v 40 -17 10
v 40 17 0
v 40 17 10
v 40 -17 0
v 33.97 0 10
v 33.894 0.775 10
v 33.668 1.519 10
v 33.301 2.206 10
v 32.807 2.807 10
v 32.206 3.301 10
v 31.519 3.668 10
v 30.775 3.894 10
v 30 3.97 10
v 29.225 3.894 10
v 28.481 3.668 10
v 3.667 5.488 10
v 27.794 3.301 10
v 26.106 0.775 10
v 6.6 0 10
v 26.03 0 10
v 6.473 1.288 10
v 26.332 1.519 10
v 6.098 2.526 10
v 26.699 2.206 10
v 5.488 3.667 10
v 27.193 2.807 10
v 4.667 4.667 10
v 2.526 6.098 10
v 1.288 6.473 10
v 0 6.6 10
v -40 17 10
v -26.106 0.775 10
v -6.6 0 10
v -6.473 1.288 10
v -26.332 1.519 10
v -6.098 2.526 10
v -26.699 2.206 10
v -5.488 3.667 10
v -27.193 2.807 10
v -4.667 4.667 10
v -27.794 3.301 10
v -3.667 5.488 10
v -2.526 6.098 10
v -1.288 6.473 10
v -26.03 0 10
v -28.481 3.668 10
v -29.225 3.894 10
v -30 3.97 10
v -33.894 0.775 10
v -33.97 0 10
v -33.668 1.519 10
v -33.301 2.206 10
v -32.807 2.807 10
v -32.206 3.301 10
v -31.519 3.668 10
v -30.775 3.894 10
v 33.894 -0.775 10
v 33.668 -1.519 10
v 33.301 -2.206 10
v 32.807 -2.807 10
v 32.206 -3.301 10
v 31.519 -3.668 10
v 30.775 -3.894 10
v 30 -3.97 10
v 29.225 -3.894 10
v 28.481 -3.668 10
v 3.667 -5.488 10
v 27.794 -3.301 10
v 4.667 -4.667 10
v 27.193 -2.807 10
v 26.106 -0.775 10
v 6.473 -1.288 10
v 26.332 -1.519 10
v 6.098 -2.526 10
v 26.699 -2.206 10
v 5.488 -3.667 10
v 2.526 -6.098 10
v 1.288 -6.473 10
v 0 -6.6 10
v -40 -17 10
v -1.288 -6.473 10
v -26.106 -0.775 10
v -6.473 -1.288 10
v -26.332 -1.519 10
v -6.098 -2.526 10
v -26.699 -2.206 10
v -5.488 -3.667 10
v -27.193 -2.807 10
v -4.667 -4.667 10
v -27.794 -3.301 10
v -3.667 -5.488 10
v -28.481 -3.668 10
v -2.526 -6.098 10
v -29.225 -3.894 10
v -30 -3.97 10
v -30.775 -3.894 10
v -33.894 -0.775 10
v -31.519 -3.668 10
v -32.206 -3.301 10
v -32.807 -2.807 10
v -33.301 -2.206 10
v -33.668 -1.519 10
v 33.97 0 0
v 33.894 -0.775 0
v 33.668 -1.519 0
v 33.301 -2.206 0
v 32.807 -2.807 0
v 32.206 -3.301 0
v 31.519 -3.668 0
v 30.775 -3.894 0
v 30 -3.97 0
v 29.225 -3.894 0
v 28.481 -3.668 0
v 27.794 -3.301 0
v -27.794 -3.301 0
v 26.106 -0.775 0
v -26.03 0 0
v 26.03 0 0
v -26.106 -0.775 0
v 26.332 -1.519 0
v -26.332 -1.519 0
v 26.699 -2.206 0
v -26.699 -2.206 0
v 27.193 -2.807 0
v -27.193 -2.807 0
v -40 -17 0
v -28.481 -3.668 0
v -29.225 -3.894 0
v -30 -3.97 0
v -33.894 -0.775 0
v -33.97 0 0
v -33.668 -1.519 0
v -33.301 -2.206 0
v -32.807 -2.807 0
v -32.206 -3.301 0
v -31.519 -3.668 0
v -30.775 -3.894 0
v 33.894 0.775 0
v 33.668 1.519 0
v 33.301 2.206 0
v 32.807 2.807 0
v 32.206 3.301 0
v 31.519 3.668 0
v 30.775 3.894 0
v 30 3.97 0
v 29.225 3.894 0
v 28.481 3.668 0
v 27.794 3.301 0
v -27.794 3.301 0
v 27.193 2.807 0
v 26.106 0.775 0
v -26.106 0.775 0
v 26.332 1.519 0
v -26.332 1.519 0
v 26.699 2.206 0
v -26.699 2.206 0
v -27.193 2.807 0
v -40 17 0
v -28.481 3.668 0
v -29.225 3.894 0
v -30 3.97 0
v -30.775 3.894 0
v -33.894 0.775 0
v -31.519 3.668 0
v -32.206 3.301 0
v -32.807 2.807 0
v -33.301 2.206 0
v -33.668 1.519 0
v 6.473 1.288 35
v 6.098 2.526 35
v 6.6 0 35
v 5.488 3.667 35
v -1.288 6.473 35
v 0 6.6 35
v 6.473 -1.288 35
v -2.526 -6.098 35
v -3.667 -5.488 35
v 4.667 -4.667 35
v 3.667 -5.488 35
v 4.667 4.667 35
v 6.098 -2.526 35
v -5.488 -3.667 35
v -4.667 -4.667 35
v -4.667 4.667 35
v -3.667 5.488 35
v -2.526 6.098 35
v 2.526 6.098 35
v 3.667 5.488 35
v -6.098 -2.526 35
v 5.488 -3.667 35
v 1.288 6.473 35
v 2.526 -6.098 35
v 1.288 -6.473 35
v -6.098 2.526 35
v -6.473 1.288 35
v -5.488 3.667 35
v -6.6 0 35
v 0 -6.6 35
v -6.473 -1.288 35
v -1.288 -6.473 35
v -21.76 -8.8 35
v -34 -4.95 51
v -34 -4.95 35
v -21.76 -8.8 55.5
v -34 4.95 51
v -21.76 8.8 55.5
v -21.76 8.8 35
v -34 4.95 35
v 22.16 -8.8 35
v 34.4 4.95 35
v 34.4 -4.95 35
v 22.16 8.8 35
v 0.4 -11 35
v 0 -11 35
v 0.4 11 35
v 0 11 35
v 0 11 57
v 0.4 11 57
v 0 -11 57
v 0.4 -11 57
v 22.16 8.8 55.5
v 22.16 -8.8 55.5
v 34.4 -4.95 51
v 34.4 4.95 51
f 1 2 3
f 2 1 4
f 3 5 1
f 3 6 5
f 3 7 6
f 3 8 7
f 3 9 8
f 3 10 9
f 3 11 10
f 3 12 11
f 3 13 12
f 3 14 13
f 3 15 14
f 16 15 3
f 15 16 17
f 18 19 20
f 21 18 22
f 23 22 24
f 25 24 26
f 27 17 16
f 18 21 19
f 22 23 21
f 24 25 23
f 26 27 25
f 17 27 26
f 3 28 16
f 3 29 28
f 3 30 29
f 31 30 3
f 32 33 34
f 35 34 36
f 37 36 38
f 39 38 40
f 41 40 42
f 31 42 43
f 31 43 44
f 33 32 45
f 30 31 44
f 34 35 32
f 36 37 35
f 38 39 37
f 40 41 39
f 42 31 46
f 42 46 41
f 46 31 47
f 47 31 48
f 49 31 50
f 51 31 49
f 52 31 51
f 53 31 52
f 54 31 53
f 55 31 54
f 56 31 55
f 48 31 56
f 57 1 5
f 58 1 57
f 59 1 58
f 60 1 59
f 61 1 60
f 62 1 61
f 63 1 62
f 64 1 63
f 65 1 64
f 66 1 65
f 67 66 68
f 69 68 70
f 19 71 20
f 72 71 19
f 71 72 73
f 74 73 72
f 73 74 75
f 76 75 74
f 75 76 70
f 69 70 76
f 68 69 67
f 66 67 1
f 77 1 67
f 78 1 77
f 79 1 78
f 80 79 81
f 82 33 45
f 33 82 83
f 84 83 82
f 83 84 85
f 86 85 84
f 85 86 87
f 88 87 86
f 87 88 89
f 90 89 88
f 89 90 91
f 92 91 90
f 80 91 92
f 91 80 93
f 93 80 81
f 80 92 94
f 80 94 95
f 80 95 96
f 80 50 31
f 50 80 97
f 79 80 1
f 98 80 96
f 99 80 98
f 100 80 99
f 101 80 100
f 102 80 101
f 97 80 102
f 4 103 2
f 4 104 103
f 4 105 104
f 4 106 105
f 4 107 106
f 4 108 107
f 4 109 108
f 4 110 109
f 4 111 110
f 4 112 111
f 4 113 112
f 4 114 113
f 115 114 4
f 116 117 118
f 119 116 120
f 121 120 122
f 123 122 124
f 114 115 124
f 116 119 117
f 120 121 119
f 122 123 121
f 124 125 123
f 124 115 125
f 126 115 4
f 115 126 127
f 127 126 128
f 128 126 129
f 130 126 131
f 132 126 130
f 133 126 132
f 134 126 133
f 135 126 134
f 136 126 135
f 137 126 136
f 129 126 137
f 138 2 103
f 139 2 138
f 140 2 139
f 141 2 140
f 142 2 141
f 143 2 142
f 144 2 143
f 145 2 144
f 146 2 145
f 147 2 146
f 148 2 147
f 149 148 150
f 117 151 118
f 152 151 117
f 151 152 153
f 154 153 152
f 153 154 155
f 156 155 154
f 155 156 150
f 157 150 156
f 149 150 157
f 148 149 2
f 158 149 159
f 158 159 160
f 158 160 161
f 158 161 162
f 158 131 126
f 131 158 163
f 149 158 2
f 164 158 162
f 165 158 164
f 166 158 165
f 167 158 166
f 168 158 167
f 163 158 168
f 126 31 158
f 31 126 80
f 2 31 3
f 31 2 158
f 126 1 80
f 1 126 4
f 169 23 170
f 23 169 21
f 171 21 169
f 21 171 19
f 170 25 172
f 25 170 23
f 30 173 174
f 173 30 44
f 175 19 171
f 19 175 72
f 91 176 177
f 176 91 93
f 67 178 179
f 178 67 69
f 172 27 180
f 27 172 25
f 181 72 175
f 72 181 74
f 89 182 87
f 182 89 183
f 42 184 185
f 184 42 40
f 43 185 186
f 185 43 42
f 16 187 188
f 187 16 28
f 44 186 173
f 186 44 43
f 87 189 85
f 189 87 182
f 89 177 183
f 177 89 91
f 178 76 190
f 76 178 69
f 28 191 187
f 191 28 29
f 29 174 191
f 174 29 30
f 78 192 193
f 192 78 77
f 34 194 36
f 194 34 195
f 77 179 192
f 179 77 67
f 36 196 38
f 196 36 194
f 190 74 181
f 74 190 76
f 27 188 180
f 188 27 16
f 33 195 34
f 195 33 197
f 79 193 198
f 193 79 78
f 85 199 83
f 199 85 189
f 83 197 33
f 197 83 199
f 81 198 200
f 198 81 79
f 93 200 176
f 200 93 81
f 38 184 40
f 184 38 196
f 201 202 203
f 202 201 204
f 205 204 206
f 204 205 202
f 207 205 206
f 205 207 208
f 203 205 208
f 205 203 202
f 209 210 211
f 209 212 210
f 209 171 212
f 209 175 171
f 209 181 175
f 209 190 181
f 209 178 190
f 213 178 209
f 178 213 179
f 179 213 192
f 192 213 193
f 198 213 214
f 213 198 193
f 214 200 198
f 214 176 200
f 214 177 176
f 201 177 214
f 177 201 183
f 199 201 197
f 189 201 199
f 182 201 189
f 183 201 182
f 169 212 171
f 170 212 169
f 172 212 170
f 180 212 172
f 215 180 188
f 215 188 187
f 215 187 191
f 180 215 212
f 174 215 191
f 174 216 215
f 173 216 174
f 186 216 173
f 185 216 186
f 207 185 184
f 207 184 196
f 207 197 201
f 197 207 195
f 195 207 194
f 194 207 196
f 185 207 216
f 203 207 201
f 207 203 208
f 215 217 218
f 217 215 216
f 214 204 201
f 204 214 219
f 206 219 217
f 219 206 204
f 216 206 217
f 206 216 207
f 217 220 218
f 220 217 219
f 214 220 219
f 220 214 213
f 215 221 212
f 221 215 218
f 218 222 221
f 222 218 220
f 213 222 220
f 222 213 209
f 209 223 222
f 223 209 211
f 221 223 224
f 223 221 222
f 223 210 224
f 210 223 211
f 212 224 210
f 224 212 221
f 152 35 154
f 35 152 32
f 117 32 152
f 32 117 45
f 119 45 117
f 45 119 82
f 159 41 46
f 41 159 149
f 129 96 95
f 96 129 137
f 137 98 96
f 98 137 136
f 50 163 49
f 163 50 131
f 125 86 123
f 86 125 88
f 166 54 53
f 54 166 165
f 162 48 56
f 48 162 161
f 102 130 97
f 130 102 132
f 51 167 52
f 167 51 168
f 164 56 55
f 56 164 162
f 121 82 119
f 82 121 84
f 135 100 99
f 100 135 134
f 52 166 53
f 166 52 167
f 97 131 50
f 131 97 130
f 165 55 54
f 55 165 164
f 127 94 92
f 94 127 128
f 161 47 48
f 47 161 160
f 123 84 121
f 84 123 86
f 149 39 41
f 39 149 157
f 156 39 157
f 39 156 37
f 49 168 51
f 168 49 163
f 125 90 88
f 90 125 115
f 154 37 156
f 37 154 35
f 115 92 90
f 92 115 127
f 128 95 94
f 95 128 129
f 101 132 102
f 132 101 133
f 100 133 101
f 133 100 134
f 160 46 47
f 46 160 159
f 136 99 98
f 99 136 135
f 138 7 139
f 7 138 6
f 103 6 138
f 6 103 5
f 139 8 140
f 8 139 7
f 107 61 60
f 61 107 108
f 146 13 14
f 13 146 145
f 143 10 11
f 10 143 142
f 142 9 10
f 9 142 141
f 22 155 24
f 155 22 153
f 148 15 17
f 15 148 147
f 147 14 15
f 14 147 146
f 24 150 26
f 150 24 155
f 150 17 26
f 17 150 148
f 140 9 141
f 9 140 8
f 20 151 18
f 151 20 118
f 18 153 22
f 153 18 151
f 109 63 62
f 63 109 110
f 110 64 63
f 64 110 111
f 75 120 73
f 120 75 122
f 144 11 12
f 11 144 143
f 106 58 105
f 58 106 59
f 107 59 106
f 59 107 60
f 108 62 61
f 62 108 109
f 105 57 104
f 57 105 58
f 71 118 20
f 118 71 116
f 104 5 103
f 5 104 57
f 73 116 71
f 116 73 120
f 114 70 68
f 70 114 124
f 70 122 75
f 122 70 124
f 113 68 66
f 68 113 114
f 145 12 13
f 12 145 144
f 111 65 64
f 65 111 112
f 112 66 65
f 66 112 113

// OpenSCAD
$fn = 32;

// ----------------------------------------------------------------------
// Boat cleat: 80 mm base, horn 46 mm up
// ----------------------------------------------------------------------

// --- parameters (mm) ---
base_l = 80;              // base length
base_w = 34;              // base width
base_t = 10;              // base thickness
horn_len = 68;            // horn length
horn_d = 22;              // horn diameter at the middle
horn_z = 46;              // horn axis height
end_drop = 6;             // how far the horn tips drop
post_d = 13.2;            // centre post diameter
holes_d = 7.94;           // fixing holes
hole_x = 30;              // fixing hole spacing

difference() {
  union() {
    translate([-40, -17, 0]) cube([base_l, base_w, base_t]);
    /* centre post, sunk 1 mm into the base */
    translate([0, 0, 9]) cylinder(h = 37, d = post_d);
    /* horn: a hull chain of boxes, full in the middle and lighter at the tips */
    hull() {
      translate([-34, -4.95, 35]) cube([0.4, 9.9, 16], center = false);
      translate([-21.76, -8.8, 35]) cube([0.4, 17.6, 20.5], center = false);
    }
    hull() {
      translate([-21.76, -8.8, 35]) cube([0.4, 17.6, 20.5], center = false);
      translate([0, -11, 35]) cube([0.4, 22, 22], center = false);
    }
    hull() {
      translate([0, -11, 35]) cube([0.4, 22, 22], center = false);
      translate([21.76, -8.8, 35]) cube([0.4, 17.6, 20.5], center = false);
    }
    hull() {
      translate([21.76, -8.8, 35]) cube([0.4, 17.6, 20.5], center = false);
      translate([34, -4.95, 35]) cube([0.4, 9.9, 16], center = false);
    }
  }
  translate([-30, 0, -2.5]) cylinder(h = base_t + 5, d = holes_d);
  translate([30, 0, -2.5]) cylinder(h = base_t + 5, d = holes_d);
}
